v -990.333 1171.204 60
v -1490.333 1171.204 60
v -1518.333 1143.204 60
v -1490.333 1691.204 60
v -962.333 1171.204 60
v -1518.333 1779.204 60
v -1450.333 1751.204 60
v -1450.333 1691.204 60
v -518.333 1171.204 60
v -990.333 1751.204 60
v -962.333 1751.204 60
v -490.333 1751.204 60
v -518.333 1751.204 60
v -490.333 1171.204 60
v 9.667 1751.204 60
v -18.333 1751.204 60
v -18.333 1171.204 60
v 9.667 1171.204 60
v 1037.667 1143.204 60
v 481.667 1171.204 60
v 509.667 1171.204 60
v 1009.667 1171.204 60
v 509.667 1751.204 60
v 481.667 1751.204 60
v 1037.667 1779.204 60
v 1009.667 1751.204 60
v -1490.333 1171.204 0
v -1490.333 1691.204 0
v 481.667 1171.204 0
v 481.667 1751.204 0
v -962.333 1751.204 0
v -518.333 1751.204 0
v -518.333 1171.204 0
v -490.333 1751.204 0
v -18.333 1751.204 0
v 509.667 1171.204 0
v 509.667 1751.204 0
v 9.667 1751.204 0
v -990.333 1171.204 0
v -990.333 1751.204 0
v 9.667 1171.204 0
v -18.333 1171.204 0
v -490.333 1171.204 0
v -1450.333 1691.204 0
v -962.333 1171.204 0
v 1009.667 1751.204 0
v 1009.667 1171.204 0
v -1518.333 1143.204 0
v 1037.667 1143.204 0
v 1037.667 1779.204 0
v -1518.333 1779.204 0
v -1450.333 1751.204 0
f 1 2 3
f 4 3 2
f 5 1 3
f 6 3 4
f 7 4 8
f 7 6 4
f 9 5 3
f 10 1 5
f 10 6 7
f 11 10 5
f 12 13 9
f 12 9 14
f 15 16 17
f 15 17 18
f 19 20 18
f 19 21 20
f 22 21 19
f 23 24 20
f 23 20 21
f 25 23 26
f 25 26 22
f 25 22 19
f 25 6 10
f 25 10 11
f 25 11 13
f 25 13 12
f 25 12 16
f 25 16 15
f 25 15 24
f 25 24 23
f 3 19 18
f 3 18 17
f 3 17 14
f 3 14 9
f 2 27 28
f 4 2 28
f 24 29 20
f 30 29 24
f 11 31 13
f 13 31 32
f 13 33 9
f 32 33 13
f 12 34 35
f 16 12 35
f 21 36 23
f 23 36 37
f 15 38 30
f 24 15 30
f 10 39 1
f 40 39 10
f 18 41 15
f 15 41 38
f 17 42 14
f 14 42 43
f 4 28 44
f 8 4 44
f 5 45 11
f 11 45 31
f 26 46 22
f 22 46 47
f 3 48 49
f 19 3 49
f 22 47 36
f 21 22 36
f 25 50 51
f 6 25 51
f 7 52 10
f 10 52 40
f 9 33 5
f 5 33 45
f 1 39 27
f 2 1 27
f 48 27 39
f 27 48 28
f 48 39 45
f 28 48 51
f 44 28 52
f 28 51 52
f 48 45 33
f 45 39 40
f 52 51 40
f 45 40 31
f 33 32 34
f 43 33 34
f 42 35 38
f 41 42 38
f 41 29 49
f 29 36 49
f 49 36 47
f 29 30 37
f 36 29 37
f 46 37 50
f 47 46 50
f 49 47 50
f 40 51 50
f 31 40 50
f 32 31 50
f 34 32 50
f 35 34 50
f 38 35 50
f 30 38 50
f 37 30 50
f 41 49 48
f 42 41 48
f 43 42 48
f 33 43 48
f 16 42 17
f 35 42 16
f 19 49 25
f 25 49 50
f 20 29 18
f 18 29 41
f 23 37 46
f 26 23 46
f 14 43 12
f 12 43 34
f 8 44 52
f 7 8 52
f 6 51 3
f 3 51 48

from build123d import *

# Parameters (mm, degrees)
F1_W     = 28
F1_H     = 580
F3_DEPTH = 60
F2_W     = 40
F2_H     = 60
F4_DEPTH = 60


with BuildPart() as f3:
    # F1 (on face) → F3 (new body)
    with BuildSketch(Plane.XY):
        Polygon((1037.666667, 1779.203768), (-1518.333333, 1779.203768), (-1518.333333, 1419.203768), (-1518.333333, 1143.203768), (1037.666667, 1143.203768), align=None)
        Polygon((-1490.333333, 1171.203768), (-1490.333333, 1751.203768), (-990.333333, 1751.203768), (-962.333333, 1751.203768), (-518.333333, 1751.203768), (-490.333333, 1751.203768), (-18.333333, 1751.203768), (9.666667, 1751.203768), (481.666667, 1751.203768), (509.666667, 1751.203768), (1009.666667, 1751.203768), (1009.666667, 1171.203768), (509.666667, 1171.203768), (481.666667, 1171.203768), (9.666667, 1171.203768), (-18.333333, 1171.203768), (-490.333333, 1171.203768), (-518.333333, 1171.203768), (-962.333333, 1171.203768), (-990.333333, 1171.203768), align=None, mode=Mode.SUBTRACT)
        with Locations((-976.333333, 1461.203768)):
            Rectangle(F1_W, F1_H)
        with Locations((-504.333333, 1461.203768)):
            Rectangle(F1_W, F1_H)
        with Locations((-4.333333, 1461.203768)):
            Rectangle(F1_W, F1_H)
        with Locations((495.666667, 1461.203768)):
            Rectangle(F1_W, F1_H)
    extrude(amount=F3_DEPTH)

    # F2 (on face) → F4 (join)
    with BuildSketch(Plane.XY):
        with Locations((-1470.333333, 1721.203768)):
            Rectangle(F2_W, F2_H)
    extrude(amount=F4_DEPTH)


solid = f3.part
